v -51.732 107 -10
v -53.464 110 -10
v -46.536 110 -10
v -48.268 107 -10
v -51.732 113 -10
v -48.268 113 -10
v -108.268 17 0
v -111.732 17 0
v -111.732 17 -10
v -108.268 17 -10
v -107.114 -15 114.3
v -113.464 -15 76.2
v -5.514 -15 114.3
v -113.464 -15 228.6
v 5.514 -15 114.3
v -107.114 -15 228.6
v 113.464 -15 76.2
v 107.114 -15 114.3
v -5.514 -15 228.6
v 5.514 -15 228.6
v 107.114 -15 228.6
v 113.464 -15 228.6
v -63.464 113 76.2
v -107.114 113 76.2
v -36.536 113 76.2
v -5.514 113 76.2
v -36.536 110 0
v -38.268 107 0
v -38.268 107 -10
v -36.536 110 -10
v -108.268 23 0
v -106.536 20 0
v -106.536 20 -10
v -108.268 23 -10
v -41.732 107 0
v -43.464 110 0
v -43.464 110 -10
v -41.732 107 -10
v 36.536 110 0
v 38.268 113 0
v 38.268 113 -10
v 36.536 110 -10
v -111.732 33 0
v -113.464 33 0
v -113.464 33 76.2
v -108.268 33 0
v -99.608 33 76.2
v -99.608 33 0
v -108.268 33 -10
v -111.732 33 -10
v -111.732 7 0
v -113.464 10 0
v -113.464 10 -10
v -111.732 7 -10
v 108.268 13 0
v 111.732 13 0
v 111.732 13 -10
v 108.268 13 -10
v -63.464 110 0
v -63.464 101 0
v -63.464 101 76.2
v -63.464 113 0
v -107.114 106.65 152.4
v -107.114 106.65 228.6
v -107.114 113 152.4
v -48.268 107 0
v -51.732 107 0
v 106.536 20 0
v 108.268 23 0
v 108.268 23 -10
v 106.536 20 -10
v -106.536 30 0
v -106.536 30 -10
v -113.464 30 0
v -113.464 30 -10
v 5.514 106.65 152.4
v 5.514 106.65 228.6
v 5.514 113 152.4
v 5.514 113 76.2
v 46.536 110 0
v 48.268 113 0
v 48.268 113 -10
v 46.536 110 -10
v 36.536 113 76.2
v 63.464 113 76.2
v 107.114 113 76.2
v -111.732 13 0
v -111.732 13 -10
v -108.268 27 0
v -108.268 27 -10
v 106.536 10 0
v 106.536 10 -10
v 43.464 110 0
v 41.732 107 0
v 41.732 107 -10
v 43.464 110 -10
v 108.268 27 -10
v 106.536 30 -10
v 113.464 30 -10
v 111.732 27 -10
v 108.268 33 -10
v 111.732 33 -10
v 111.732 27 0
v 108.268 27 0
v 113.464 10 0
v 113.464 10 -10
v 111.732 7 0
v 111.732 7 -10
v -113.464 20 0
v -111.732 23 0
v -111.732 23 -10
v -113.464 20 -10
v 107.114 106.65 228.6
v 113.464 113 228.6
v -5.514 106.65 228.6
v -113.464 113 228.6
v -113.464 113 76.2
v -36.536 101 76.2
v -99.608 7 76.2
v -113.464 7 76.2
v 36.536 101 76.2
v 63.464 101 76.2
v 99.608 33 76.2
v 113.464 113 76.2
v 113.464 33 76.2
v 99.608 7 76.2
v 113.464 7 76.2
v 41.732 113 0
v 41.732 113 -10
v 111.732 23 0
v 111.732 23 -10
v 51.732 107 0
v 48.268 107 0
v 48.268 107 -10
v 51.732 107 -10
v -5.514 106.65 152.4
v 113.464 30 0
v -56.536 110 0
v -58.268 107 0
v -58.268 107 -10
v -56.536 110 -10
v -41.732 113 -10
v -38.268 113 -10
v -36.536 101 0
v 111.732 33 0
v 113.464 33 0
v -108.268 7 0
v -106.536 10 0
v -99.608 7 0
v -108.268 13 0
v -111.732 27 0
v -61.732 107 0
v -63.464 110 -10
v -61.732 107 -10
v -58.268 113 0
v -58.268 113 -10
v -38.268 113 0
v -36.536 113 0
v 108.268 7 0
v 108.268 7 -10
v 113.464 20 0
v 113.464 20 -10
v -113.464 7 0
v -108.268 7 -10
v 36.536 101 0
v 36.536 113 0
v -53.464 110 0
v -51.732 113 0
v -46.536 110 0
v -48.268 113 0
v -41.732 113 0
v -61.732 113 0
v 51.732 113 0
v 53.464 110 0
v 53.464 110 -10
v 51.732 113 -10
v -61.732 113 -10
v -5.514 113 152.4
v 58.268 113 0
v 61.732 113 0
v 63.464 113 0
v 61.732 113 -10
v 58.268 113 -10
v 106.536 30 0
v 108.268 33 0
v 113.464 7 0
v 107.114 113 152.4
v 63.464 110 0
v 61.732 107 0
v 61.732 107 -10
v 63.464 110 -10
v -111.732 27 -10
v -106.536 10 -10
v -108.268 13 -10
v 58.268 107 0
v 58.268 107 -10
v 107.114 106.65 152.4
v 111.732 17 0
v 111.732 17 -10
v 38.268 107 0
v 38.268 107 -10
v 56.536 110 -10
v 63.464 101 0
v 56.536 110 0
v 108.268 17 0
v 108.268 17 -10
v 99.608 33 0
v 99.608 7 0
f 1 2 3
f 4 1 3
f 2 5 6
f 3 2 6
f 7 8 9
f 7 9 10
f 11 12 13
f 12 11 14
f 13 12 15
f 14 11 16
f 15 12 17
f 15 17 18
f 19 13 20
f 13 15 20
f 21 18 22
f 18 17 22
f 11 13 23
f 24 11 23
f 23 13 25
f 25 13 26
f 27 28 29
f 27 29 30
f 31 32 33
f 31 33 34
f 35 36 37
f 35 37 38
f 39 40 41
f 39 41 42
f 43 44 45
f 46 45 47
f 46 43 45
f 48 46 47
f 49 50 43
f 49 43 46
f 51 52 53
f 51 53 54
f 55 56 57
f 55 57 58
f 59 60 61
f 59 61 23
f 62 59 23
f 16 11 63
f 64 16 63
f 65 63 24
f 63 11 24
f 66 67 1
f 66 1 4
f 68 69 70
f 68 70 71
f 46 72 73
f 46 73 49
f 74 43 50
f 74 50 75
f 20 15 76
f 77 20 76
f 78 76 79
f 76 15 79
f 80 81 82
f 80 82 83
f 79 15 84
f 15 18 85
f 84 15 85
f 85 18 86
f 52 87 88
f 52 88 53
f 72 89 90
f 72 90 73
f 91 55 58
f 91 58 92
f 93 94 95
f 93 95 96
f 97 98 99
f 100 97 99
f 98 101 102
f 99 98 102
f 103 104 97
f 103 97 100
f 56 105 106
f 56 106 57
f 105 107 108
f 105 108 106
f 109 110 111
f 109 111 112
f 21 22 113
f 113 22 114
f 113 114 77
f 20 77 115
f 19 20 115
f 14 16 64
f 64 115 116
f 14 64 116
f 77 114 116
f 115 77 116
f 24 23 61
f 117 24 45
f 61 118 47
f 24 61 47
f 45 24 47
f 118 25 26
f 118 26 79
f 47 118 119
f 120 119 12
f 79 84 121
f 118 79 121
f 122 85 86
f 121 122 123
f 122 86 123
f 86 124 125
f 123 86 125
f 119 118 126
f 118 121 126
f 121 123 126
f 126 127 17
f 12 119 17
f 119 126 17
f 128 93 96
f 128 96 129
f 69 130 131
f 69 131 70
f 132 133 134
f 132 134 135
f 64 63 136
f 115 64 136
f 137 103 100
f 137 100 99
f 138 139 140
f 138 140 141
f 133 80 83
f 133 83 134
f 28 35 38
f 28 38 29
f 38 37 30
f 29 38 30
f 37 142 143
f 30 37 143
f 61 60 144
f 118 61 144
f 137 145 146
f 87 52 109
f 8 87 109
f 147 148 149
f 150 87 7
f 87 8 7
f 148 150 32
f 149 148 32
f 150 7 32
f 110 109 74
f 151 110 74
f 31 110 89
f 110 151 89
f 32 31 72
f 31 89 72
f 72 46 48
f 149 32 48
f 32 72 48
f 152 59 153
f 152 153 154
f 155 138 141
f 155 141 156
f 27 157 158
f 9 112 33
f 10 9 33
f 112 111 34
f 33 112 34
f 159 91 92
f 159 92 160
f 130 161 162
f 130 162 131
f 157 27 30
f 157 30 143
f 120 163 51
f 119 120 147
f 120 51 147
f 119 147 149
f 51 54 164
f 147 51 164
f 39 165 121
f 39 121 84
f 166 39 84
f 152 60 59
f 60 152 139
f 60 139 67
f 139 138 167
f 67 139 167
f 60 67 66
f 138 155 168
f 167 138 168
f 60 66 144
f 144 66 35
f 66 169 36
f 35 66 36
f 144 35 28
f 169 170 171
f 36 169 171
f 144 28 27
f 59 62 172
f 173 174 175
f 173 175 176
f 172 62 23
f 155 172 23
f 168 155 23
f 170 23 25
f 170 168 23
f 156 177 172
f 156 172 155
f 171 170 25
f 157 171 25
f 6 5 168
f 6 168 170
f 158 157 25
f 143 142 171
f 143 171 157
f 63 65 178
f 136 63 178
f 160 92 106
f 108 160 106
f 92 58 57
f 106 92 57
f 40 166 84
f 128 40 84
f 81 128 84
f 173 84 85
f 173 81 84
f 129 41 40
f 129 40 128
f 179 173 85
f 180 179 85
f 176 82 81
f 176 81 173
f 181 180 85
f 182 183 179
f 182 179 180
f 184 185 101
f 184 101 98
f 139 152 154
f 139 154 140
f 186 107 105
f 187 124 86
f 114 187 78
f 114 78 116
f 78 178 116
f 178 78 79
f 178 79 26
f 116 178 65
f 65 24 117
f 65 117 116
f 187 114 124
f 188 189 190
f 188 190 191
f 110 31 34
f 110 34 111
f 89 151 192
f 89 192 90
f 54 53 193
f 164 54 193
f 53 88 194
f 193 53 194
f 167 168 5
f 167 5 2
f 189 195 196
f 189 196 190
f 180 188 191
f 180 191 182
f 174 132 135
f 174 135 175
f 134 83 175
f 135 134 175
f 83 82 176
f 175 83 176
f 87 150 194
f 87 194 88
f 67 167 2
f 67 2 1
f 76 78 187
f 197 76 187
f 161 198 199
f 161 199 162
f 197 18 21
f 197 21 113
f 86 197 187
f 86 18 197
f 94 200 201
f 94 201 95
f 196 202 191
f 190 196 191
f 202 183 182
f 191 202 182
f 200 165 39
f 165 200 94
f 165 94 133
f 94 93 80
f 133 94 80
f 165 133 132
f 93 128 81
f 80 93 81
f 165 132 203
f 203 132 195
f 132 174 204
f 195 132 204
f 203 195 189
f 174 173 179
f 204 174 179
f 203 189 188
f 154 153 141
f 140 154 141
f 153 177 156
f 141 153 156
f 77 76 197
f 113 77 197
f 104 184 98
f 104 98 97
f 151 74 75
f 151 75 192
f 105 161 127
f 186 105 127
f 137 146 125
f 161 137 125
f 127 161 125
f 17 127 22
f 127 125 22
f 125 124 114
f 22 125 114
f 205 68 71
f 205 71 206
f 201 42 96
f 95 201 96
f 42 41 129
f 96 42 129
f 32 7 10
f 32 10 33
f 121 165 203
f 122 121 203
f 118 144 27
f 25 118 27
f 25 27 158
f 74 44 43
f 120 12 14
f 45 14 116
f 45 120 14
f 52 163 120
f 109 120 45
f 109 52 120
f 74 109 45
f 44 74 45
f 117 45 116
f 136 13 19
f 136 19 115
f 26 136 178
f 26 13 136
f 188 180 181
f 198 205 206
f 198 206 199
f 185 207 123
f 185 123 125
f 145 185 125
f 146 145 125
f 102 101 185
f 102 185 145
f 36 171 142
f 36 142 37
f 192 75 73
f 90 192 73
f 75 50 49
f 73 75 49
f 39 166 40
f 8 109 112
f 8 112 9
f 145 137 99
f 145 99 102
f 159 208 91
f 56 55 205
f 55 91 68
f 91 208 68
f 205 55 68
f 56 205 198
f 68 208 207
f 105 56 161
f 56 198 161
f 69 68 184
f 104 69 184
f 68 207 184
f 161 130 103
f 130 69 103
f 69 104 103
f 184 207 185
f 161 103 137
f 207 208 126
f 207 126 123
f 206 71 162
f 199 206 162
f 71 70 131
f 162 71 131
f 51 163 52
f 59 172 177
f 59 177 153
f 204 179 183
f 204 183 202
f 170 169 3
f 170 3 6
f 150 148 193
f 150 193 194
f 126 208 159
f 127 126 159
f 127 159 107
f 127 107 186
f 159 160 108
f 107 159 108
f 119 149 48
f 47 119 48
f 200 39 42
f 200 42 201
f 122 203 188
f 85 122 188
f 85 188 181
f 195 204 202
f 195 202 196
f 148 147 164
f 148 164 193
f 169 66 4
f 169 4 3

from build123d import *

# Parameters (mm, degrees)
BOSS_EXTRUDE5_DEPTH    = 10
BOSS_EXTRUDE5_2_DEPTH  = 10
BOSS_EXTRUDE5_3_DEPTH  = 10
BOSS_EXTRUDE5_4_DEPTH  = 10
BOSS_EXTRUDE5_5_DEPTH  = 10
BOSS_EXTRUDE5_6_DEPTH  = 10
BOSS_EXTRUDE5_7_DEPTH  = 10
BOSS_EXTRUDE5_8_DEPTH  = 10
BOSS_EXTRUDE5_9_DEPTH  = 10
BOSS_EXTRUDE5_10_DEPTH = 10
BOSS_EXTRUDE5_11_DEPTH = 10
BOSS_EXTRUDE5_12_DEPTH = 10
SKETCH5_W              = 13.85640646
SKETCH5_H              = 26
SKETCH5_W_2            = 26.92820323
SKETCH5_H_2            = 12
BOSS_EXTRUDE8_DEPTH    = 76.2
BOSS_EXTRUDE9_REACH    = 266.711
SKETCH9_W              = 6.35
SKETCH9_H              = 128.000000074
SKETCH9_W_2            = 11.02820323
BOSS_EXTRUDE10_DEPTH   = 152.4
SKETCH11_W             = 226.92820323
SKETCH11_H             = 76.2
BOSS_EXTRUDE11_DEPTH   = 6.35


with BuildPart() as part:
    # Sketch2 → Boss-Extrude5 (new body)
    with BuildSketch(Plane.XY):
        Polygon((-111.732050808, 13), (-113.464101615, 10), (-111.732050808, 7), (-108.267949192, 7), (-106.535898385, 10), (-108.267949192, 13), align=None)
    extrude(amount=-BOSS_EXTRUDE5_DEPTH)



with BuildPart() as body_2:
    # Sketch2 → Boss-Extrude5 2 (new body)
    with BuildSketch(Plane.XY):
        Polygon((-111.732050808, 23), (-113.464101615, 20), (-111.732050808, 17), (-108.267949192, 17), (-106.535898385, 20), (-108.267949192, 23), align=None)
    extrude(amount=-BOSS_EXTRUDE5_2_DEPTH)


with BuildPart() as body_3:
    # Sketch2 → Boss-Extrude5 3 (new body)
    with BuildSketch(Plane.XY):
        Polygon((-111.732050808, 33), (-113.464101615, 30), (-111.732050808, 27), (-108.267949192, 27), (-106.535898385, 30), (-108.267949192, 33), align=None)
    extrude(amount=-BOSS_EXTRUDE5_3_DEPTH)


with BuildPart() as body_4:
    # Sketch2 → Boss-Extrude5 4 (new body)
    with BuildSketch(Plane.XY):
        Polygon((111.732050808, 27), (113.464101615, 30), (111.732050808, 33), (108.267949192, 33), (106.535898385, 30), (108.267949192, 27), align=None)
    extrude(amount=-BOSS_EXTRUDE5_4_DEPTH)


with BuildPart() as body_5:
    # Sketch2 → Boss-Extrude5 5 (new body)
    with BuildSketch(Plane.XY):
        Polygon((111.732050808, 17), (113.464101615, 20), (111.732050808, 23), (108.267949192, 23), (106.535898385, 20), (108.267949192, 17), align=None)
    extrude(amount=-BOSS_EXTRUDE5_5_DEPTH)


with BuildPart() as body_6:
    # Sketch2 → Boss-Extrude5 6 (new body)
    with BuildSketch(Plane.XY):
        Polygon((111.732050808, 7), (113.464101615, 10), (111.732050808, 13), (108.267949192, 13), (106.535898385, 10), (108.267949192, 7), align=None)
    extrude(amount=-BOSS_EXTRUDE5_6_DEPTH)


with BuildPart() as body_7:
    # Sketch2 → Boss-Extrude5 7 (new body)
    with BuildSketch(Plane.XY):
        Polygon((61.732050808, 107), (63.464101615, 110), (61.732050808, 113), (58.267949192, 113), (56.535898385, 110), (58.267949192, 107), align=None)
    extrude(amount=-BOSS_EXTRUDE5_7_DEPTH)


with BuildPart() as body_8:
    # Sketch2 → Boss-Extrude5 8 (new body)
    with BuildSketch(Plane.XY):
        Polygon((51.732050808, 107), (53.464101615, 110), (51.732050808, 113), (48.267949192, 113), (46.535898385, 110), (48.267949192, 107), align=None)
    extrude(amount=-BOSS_EXTRUDE5_8_DEPTH)


with BuildPart() as body_9:
    # Sketch2 → Boss-Extrude5 9 (new body)
    with BuildSketch(Plane.XY):
        Polygon((41.732050808, 107), (43.464101615, 110), (41.732050808, 113), (38.267949192, 113), (36.535898385, 110), (38.267949192, 107), align=None)
    extrude(amount=-BOSS_EXTRUDE5_9_DEPTH)


with BuildPart() as body_10:
    # Sketch2 → Boss-Extrude5 10 (new body)
    with BuildSketch(Plane.XY):
        Polygon((-38.267949192, 107), (-36.535898385, 110), (-38.267949192, 113), (-41.732050808, 113), (-43.464101615, 110), (-41.732050808, 107), align=None)
    extrude(amount=-BOSS_EXTRUDE5_10_DEPTH)


with BuildPart() as body_11:
    # Sketch2 → Boss-Extrude5 11 (new body)
    with BuildSketch(Plane.XY):
        Polygon((-48.267949192, 107), (-46.535898385, 110), (-48.267949192, 113), (-51.732050808, 113), (-53.464101615, 110), (-51.732050808, 107), align=None)
    extrude(amount=-BOSS_EXTRUDE5_11_DEPTH)


with BuildPart() as body_12:
    # Sketch2 → Boss-Extrude5 12 (new body)
    with BuildSketch(Plane.XY):
        Polygon((-58.267949192, 107), (-56.535898385, 110), (-58.267949192, 113), (-61.732050808, 113), (-63.464101615, 110), (-61.732050808, 107), align=None)
    extrude(amount=-BOSS_EXTRUDE5_12_DEPTH)


with BuildPart() as part_1:
    add(part.part)

    add(body_2.part)  # Boss-Extrude8 merges body 2

    add(body_3.part)  # Boss-Extrude8 merges body 3

    add(body_4.part)  # Boss-Extrude8 merges body 4

    add(body_5.part)  # Boss-Extrude8 merges body 5

    add(body_6.part)  # Boss-Extrude8 merges body 6

    add(body_7.part)  # Boss-Extrude8 merges body 7

    add(body_8.part)  # Boss-Extrude8 merges body 8

    add(body_9.part)  # Boss-Extrude8 merges body 9

    add(body_10.part)  # Boss-Extrude8 merges body 10

    add(body_11.part)  # Boss-Extrude8 merges body 11

    add(body_12.part)  # Boss-Extrude8 merges body 12
    # Sketch5 → Boss-Extrude8 (add)
    with BuildSketch(Plane.XY):
        with Locations((-106.535898385, 20)):
            Rectangle(SKETCH5_W, SKETCH5_H)
        with Locations((-50, 107)):
            Rectangle(SKETCH5_W_2, SKETCH5_H_2)
        with Locations((50, 107)):
            Rectangle(SKETCH5_W_2, SKETCH5_H_2)
        with Locations((106.535898385, 20)):
            Rectangle(SKETCH5_W, SKETCH5_H)
    extrude(amount=BOSS_EXTRUDE8_DEPTH)

    # Boss-Extrude9: up to this face of the body (flat: up to its plane)
    boss_extrude9_end = Plane(part_1.part.faces().sort_by_distance((-113.464101615, 20, 38.1))[0])
    # Sketch8 → Boss-Extrude9 (add, up to the picked face)
    with BuildSketch(Plane(origin=(113.464101615, 0, 0), x_dir=(0, 0, -1), z_dir=(1, 0, 0)), mode=Mode.PRIVATE) as boss_extrude9_sk1:
        Polygon((-76.2, 113), (-76.2, -15.000000074), (-114.3, -15.000000074), align=None)
    boss_extrude9_tool1 = split(extrude(boss_extrude9_sk1.sketch, amount=-BOSS_EXTRUDE9_REACH, mode=Mode.PRIVATE), bisect_by=boss_extrude9_end, keep=Keep.BOTH, mode=Mode.PRIVATE)
    add(boss_extrude9_tool1.solids().sort_by(Axis((113.464102, 27.666667, 88.9), (-1, 0, 0)))[0])

    # Sketch9 → Boss-Extrude10 (add)
    with BuildSketch(Plane(origin=(0, 0, 76.2), x_dir=(-1, 0, 0), z_dir=(0, 0, -1))):
        with Locations((-110.289101615, 48.999999963)):
            Rectangle(SKETCH9_W, SKETCH9_H)
        with Locations((110.289101615, 48.999999963)):
            Rectangle(SKETCH9_W, SKETCH9_H)
        with Locations((0, 48.999999963)):
            Rectangle(SKETCH9_W_2, SKETCH9_H)
    extrude(amount=-BOSS_EXTRUDE10_DEPTH)

    # Sketch11 → Boss-Extrude11 (add)
    with BuildSketch(Plane(origin=(0, 113, 0), x_dir=(1, 0, 0), z_dir=(0, 1, 0))):
        with Locations((0, -190.5)):
            Rectangle(SKETCH11_W, SKETCH11_H)
    extrude(amount=-BOSS_EXTRUDE11_DEPTH)


solid = part_1.part
